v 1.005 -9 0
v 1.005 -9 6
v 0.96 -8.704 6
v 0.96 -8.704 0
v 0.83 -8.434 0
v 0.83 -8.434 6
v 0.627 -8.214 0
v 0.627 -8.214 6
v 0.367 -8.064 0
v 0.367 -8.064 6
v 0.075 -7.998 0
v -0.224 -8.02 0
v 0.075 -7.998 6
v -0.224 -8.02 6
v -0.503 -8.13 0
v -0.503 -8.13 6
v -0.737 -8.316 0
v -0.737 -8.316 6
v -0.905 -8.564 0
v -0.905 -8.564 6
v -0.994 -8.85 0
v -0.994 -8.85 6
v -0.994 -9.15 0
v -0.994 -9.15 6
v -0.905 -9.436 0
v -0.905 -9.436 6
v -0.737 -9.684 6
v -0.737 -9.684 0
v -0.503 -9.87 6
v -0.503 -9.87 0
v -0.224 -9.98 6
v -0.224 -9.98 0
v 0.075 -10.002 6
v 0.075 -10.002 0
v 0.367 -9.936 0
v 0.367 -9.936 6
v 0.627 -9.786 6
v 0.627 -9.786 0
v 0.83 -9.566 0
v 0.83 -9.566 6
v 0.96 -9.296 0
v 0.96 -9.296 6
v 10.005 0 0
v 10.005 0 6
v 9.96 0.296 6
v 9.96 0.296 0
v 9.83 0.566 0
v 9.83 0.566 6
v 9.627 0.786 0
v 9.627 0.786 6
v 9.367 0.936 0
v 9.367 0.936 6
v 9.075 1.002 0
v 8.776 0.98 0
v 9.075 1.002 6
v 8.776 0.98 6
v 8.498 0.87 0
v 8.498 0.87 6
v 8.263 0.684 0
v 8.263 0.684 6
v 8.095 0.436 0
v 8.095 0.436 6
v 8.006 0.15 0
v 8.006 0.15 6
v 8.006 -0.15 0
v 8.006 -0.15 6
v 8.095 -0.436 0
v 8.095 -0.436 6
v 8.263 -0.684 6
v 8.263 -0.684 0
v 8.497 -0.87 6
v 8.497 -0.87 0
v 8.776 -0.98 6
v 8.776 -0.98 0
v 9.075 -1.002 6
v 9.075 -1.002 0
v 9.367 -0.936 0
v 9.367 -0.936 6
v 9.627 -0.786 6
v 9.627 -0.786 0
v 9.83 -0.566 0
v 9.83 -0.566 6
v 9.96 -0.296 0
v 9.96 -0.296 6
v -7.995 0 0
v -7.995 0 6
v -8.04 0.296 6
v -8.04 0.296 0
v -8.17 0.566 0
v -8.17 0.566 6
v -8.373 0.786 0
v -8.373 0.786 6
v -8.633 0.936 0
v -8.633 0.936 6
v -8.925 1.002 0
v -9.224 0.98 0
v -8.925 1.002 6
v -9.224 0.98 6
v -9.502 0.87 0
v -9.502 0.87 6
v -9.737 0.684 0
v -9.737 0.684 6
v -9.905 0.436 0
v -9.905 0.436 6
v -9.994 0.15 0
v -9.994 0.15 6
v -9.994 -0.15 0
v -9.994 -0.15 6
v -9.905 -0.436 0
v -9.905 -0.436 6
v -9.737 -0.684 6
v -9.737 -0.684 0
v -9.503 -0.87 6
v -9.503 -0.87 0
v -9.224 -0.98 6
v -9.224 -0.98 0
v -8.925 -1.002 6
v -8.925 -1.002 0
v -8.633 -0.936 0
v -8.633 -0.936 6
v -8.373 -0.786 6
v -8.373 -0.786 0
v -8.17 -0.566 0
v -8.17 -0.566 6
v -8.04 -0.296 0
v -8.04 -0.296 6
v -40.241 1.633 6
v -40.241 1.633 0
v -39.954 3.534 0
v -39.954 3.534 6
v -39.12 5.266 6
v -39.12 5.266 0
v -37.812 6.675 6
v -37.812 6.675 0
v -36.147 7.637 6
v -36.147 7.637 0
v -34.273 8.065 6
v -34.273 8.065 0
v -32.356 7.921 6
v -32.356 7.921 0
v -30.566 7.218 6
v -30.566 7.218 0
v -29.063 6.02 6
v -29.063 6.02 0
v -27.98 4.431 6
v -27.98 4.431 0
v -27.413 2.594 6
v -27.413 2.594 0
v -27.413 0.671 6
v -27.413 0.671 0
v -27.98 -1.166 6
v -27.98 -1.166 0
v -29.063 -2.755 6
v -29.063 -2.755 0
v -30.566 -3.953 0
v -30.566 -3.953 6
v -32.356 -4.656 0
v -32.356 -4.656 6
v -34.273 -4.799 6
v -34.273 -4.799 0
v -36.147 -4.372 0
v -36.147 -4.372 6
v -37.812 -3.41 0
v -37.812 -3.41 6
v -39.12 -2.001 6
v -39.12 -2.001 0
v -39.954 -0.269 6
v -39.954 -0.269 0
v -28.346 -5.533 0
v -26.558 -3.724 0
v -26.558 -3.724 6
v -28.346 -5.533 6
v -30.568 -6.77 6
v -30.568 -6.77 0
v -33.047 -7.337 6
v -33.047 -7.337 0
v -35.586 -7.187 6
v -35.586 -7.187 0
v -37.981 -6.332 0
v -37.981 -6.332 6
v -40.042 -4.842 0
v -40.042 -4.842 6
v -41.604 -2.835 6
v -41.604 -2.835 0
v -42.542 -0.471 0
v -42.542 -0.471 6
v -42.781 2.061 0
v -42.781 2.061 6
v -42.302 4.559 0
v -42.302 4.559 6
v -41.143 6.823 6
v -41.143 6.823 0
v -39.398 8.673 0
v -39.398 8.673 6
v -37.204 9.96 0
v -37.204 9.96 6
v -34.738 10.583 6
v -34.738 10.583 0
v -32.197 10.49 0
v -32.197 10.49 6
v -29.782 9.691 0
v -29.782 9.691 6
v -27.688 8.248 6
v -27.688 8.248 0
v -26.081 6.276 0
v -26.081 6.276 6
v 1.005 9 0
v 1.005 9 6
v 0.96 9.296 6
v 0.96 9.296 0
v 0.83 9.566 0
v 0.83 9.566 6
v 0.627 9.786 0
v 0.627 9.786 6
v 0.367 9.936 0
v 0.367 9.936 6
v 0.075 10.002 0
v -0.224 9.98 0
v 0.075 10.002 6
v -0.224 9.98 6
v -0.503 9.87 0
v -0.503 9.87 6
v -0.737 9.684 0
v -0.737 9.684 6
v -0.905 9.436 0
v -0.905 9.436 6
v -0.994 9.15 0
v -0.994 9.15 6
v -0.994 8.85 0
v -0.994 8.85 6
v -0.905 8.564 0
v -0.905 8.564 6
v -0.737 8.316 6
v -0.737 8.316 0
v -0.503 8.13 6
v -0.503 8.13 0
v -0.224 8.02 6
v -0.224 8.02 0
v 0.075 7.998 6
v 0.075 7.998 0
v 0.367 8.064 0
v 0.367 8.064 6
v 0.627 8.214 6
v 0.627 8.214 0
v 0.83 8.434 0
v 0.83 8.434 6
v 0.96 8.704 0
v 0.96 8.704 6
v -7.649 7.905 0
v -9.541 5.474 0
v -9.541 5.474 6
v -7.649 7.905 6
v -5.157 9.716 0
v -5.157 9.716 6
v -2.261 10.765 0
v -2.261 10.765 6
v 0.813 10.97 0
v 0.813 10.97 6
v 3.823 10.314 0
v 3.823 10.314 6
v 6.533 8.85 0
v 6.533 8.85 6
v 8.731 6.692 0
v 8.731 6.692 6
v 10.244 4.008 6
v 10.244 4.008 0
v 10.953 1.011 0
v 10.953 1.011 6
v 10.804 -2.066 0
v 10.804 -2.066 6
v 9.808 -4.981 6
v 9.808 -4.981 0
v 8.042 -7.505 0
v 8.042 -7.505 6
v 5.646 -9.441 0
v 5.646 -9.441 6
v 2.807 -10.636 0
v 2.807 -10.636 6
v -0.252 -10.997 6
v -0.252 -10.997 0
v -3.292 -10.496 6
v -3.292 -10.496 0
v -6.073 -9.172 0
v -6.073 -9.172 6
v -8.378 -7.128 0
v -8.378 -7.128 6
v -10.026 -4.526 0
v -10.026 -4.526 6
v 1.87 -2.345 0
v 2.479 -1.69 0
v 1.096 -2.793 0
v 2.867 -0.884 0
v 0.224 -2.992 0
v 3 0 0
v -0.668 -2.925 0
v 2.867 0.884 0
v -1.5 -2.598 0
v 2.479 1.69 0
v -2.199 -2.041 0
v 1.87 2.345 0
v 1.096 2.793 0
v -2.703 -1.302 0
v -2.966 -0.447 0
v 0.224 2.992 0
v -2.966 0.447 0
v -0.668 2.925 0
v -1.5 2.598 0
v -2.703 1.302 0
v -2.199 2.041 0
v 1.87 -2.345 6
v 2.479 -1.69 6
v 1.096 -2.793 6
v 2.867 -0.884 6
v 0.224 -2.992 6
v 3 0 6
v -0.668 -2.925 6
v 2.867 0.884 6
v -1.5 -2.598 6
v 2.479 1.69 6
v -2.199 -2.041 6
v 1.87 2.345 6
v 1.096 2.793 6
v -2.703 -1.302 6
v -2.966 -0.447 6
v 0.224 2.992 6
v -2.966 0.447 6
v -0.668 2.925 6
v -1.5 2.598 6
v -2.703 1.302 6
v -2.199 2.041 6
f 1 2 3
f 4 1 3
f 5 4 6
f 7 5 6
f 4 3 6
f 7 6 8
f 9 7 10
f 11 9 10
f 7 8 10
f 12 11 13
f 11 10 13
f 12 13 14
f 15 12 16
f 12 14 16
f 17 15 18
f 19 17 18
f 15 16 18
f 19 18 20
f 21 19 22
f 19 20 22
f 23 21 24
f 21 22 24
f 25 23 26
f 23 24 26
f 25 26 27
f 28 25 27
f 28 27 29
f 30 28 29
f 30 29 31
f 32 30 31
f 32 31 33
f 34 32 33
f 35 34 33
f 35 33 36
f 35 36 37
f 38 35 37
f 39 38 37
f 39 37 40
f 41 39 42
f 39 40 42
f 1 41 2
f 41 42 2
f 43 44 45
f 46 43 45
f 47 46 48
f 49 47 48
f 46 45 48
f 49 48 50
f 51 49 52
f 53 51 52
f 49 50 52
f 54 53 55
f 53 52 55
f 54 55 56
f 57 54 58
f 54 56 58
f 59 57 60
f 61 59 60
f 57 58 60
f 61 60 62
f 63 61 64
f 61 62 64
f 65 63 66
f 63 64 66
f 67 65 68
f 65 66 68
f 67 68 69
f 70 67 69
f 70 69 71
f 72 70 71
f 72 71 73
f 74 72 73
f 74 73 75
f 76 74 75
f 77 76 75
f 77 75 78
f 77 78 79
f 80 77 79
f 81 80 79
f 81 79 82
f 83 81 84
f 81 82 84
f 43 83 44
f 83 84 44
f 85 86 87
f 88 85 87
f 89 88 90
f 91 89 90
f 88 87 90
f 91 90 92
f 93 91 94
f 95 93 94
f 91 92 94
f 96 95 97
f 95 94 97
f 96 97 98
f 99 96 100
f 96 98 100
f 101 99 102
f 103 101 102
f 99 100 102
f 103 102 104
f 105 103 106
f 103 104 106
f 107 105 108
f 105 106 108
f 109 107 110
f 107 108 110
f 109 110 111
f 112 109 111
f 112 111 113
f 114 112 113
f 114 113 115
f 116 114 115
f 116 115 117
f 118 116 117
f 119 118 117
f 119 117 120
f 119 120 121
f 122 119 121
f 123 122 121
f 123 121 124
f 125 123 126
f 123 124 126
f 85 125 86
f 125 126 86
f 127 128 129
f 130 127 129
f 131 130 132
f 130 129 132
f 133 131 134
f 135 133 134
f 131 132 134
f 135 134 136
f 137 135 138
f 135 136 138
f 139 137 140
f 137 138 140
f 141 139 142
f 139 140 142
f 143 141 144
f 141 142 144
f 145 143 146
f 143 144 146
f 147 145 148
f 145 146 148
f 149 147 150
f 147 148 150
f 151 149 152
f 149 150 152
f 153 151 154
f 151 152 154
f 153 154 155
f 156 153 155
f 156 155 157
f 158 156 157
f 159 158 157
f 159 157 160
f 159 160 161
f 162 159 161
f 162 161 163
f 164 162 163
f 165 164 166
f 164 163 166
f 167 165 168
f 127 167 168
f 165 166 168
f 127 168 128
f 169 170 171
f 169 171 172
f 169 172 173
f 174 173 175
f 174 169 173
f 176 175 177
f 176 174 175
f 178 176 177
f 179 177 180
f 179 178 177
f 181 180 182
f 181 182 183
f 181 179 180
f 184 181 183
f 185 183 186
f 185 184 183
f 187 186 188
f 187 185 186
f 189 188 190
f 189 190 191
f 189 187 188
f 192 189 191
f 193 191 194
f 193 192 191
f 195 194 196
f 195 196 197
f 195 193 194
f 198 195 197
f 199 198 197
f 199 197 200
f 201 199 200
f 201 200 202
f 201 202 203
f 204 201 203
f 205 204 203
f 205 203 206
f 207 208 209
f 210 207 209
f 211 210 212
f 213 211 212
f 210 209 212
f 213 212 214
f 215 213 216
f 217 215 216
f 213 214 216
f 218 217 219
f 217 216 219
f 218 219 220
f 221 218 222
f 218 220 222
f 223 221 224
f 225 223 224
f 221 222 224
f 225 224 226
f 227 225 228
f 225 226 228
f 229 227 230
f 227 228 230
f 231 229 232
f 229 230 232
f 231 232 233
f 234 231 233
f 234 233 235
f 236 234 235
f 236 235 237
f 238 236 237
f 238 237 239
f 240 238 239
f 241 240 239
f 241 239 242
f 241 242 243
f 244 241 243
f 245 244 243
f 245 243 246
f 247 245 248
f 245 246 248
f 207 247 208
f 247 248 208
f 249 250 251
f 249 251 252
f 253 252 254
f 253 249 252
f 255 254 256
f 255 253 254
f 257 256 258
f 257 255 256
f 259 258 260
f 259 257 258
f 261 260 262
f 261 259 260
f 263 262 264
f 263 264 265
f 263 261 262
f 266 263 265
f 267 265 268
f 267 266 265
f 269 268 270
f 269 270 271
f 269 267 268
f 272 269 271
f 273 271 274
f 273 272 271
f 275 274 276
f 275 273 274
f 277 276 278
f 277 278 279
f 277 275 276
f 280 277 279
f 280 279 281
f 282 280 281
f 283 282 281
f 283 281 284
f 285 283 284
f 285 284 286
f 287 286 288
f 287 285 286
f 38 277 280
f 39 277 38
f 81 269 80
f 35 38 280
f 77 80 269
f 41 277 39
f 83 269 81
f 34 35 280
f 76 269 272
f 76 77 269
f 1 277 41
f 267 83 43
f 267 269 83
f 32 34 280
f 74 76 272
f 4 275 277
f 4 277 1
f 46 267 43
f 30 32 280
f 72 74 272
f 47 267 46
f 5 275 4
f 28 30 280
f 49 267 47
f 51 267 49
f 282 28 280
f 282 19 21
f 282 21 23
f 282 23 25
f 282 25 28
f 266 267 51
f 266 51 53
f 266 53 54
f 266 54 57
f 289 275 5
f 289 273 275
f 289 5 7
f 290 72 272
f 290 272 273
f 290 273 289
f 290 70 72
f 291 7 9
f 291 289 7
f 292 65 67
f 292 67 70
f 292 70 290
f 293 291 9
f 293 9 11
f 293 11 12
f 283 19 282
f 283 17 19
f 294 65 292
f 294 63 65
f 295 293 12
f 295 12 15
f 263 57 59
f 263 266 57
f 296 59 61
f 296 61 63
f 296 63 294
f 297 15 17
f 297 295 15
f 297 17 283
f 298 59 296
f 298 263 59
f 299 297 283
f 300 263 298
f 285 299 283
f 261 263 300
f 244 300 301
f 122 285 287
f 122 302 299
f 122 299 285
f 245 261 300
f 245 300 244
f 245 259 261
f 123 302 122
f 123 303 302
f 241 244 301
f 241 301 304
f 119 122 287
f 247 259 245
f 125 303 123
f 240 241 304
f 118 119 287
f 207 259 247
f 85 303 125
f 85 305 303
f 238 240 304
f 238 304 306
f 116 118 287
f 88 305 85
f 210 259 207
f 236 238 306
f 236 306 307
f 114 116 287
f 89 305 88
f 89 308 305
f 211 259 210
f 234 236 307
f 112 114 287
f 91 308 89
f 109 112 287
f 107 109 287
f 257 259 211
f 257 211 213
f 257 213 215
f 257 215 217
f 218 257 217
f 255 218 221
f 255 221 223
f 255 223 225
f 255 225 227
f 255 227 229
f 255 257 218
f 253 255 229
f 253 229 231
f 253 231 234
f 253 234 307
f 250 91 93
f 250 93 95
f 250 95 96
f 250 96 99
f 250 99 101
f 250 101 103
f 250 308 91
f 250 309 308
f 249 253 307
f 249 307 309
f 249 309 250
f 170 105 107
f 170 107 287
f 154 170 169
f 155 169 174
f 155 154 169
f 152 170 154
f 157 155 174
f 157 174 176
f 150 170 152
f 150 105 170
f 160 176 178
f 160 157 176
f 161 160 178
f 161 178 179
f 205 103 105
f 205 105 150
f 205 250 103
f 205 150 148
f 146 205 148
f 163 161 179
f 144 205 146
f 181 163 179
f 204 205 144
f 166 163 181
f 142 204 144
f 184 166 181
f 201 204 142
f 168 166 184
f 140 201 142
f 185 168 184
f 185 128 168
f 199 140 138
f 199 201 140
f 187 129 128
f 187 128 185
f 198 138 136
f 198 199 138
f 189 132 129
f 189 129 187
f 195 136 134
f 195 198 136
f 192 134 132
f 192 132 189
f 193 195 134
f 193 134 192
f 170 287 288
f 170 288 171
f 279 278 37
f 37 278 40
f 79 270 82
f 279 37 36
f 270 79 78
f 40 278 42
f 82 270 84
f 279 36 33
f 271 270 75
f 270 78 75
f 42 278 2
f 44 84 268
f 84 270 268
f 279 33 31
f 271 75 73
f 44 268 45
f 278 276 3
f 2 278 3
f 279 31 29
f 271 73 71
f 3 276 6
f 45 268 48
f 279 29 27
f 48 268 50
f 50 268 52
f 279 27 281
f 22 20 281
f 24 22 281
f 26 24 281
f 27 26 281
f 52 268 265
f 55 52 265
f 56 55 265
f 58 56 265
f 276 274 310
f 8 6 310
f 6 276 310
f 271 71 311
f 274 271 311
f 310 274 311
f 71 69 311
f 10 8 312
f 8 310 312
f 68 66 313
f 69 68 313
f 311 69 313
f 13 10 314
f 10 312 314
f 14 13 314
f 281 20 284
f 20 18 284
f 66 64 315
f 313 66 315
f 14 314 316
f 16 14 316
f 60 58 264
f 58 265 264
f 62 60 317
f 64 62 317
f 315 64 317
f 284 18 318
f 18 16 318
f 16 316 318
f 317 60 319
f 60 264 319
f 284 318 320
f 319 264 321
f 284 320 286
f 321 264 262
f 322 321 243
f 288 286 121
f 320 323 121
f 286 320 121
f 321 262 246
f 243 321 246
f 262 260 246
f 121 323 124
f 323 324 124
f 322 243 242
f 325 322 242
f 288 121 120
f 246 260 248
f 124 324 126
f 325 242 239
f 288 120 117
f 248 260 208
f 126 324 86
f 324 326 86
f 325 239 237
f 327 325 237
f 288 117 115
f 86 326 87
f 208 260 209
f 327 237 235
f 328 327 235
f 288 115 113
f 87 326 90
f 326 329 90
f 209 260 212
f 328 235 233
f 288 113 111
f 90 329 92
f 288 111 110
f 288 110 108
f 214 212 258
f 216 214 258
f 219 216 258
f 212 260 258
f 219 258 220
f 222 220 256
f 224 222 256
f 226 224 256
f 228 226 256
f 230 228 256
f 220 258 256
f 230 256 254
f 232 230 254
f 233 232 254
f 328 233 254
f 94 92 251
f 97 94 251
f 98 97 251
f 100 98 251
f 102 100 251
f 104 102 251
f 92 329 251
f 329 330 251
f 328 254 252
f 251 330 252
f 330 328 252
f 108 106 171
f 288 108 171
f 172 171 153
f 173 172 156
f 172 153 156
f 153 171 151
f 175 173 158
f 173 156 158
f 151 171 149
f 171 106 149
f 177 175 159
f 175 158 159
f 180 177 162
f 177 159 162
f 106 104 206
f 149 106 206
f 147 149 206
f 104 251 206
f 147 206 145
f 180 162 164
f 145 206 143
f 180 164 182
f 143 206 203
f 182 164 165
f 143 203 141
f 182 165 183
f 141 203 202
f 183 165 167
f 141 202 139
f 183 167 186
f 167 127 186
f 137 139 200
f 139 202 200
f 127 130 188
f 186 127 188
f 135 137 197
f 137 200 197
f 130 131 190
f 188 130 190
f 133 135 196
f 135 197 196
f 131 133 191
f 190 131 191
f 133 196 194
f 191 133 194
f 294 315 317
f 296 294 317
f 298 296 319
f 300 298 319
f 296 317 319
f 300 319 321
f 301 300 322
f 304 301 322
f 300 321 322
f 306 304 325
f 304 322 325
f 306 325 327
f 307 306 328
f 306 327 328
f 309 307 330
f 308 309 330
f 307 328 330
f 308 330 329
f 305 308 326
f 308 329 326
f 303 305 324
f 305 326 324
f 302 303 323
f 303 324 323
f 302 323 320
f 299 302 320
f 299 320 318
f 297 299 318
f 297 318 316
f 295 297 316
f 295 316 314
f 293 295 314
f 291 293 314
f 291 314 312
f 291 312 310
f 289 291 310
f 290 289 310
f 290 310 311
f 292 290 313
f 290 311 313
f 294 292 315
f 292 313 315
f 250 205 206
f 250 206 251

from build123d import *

# Parameters (mm, degrees)
BOSS_EXTRU_1_DEPTH      = 6
ESQUISSE2_R             = 1.005
ESQUISSE2_R_2           = 3
ENL_V_MAT_EXTRU_1_DEPTH = 6
ESQUISSE3_R             = 9
BOSS_EXTRU_2_DEPTH      = 6
ESQUISSE5_R             = 6.45
ENL_V_MAT_EXTRU_2_DEPTH = 6


with BuildPart() as part:
    # Esquisse1 → Boss.-Extru.1 (new body)
    with BuildSketch(Plane.XY):
        with BuildLine():
            Line((-10.02588737, -4.525658234), (-40.02588737, -3.070914704))
            Line((-40.02588737, -3.070914704), (-39.541047229, 6.929085296))
            Line((-39.541047229, 6.929085296), (-9.541047229, 5.474341766))
            ThreePointArc((-9.541047229, 5.474341766), (10.987093901, -0.532698415), (-10.02588737, -4.525658234))
        make_face()
    extrude(amount=BOSS_EXTRU_1_DEPTH)

    # Esquisse2 → Enlèv. mat.-Extru.1 (cut)
    with BuildSketch(Plane.XY.offset(6)):
        with Locations((0, 9)):
            Circle(ESQUISSE2_R)
        with Locations((9, 0)):
            Circle(ESQUISSE2_R)
        with Locations((0, -9)):
            Circle(ESQUISSE2_R)
        with Locations((-9, 0)):
            Circle(ESQUISSE2_R)
        with Locations((-33.790793572, 1.632611651)):
            Circle(ESQUISSE2_R)
        Circle(ESQUISSE2_R_2)
    extrude(amount=-ENL_V_MAT_EXTRU_1_DEPTH, mode=Mode.SUBTRACT)

    # Esquisse3 → Boss.-Extru.2 (add)
    with BuildSketch(Plane(origin=(0, 0, 0), x_dir=(-1, 0, 0), z_dir=(0, 0, -1))):
        with Locations((33.790793572, 1.632611651)):
            Circle(ESQUISSE3_R)
    extrude(amount=-BOSS_EXTRU_2_DEPTH)

    # Esquisse5 → Enlèv. mat.-Extru.2 (cut)
    with BuildSketch(Plane(origin=(0, 0, 0), x_dir=(-1, 0, 0), z_dir=(0, 0, -1))):
        with Locations((33.790793572, 1.632611651)):
            Circle(ESQUISSE5_R)
    extrude(amount=-ENL_V_MAT_EXTRU_2_DEPTH, mode=Mode.SUBTRACT)


solid = part.part
